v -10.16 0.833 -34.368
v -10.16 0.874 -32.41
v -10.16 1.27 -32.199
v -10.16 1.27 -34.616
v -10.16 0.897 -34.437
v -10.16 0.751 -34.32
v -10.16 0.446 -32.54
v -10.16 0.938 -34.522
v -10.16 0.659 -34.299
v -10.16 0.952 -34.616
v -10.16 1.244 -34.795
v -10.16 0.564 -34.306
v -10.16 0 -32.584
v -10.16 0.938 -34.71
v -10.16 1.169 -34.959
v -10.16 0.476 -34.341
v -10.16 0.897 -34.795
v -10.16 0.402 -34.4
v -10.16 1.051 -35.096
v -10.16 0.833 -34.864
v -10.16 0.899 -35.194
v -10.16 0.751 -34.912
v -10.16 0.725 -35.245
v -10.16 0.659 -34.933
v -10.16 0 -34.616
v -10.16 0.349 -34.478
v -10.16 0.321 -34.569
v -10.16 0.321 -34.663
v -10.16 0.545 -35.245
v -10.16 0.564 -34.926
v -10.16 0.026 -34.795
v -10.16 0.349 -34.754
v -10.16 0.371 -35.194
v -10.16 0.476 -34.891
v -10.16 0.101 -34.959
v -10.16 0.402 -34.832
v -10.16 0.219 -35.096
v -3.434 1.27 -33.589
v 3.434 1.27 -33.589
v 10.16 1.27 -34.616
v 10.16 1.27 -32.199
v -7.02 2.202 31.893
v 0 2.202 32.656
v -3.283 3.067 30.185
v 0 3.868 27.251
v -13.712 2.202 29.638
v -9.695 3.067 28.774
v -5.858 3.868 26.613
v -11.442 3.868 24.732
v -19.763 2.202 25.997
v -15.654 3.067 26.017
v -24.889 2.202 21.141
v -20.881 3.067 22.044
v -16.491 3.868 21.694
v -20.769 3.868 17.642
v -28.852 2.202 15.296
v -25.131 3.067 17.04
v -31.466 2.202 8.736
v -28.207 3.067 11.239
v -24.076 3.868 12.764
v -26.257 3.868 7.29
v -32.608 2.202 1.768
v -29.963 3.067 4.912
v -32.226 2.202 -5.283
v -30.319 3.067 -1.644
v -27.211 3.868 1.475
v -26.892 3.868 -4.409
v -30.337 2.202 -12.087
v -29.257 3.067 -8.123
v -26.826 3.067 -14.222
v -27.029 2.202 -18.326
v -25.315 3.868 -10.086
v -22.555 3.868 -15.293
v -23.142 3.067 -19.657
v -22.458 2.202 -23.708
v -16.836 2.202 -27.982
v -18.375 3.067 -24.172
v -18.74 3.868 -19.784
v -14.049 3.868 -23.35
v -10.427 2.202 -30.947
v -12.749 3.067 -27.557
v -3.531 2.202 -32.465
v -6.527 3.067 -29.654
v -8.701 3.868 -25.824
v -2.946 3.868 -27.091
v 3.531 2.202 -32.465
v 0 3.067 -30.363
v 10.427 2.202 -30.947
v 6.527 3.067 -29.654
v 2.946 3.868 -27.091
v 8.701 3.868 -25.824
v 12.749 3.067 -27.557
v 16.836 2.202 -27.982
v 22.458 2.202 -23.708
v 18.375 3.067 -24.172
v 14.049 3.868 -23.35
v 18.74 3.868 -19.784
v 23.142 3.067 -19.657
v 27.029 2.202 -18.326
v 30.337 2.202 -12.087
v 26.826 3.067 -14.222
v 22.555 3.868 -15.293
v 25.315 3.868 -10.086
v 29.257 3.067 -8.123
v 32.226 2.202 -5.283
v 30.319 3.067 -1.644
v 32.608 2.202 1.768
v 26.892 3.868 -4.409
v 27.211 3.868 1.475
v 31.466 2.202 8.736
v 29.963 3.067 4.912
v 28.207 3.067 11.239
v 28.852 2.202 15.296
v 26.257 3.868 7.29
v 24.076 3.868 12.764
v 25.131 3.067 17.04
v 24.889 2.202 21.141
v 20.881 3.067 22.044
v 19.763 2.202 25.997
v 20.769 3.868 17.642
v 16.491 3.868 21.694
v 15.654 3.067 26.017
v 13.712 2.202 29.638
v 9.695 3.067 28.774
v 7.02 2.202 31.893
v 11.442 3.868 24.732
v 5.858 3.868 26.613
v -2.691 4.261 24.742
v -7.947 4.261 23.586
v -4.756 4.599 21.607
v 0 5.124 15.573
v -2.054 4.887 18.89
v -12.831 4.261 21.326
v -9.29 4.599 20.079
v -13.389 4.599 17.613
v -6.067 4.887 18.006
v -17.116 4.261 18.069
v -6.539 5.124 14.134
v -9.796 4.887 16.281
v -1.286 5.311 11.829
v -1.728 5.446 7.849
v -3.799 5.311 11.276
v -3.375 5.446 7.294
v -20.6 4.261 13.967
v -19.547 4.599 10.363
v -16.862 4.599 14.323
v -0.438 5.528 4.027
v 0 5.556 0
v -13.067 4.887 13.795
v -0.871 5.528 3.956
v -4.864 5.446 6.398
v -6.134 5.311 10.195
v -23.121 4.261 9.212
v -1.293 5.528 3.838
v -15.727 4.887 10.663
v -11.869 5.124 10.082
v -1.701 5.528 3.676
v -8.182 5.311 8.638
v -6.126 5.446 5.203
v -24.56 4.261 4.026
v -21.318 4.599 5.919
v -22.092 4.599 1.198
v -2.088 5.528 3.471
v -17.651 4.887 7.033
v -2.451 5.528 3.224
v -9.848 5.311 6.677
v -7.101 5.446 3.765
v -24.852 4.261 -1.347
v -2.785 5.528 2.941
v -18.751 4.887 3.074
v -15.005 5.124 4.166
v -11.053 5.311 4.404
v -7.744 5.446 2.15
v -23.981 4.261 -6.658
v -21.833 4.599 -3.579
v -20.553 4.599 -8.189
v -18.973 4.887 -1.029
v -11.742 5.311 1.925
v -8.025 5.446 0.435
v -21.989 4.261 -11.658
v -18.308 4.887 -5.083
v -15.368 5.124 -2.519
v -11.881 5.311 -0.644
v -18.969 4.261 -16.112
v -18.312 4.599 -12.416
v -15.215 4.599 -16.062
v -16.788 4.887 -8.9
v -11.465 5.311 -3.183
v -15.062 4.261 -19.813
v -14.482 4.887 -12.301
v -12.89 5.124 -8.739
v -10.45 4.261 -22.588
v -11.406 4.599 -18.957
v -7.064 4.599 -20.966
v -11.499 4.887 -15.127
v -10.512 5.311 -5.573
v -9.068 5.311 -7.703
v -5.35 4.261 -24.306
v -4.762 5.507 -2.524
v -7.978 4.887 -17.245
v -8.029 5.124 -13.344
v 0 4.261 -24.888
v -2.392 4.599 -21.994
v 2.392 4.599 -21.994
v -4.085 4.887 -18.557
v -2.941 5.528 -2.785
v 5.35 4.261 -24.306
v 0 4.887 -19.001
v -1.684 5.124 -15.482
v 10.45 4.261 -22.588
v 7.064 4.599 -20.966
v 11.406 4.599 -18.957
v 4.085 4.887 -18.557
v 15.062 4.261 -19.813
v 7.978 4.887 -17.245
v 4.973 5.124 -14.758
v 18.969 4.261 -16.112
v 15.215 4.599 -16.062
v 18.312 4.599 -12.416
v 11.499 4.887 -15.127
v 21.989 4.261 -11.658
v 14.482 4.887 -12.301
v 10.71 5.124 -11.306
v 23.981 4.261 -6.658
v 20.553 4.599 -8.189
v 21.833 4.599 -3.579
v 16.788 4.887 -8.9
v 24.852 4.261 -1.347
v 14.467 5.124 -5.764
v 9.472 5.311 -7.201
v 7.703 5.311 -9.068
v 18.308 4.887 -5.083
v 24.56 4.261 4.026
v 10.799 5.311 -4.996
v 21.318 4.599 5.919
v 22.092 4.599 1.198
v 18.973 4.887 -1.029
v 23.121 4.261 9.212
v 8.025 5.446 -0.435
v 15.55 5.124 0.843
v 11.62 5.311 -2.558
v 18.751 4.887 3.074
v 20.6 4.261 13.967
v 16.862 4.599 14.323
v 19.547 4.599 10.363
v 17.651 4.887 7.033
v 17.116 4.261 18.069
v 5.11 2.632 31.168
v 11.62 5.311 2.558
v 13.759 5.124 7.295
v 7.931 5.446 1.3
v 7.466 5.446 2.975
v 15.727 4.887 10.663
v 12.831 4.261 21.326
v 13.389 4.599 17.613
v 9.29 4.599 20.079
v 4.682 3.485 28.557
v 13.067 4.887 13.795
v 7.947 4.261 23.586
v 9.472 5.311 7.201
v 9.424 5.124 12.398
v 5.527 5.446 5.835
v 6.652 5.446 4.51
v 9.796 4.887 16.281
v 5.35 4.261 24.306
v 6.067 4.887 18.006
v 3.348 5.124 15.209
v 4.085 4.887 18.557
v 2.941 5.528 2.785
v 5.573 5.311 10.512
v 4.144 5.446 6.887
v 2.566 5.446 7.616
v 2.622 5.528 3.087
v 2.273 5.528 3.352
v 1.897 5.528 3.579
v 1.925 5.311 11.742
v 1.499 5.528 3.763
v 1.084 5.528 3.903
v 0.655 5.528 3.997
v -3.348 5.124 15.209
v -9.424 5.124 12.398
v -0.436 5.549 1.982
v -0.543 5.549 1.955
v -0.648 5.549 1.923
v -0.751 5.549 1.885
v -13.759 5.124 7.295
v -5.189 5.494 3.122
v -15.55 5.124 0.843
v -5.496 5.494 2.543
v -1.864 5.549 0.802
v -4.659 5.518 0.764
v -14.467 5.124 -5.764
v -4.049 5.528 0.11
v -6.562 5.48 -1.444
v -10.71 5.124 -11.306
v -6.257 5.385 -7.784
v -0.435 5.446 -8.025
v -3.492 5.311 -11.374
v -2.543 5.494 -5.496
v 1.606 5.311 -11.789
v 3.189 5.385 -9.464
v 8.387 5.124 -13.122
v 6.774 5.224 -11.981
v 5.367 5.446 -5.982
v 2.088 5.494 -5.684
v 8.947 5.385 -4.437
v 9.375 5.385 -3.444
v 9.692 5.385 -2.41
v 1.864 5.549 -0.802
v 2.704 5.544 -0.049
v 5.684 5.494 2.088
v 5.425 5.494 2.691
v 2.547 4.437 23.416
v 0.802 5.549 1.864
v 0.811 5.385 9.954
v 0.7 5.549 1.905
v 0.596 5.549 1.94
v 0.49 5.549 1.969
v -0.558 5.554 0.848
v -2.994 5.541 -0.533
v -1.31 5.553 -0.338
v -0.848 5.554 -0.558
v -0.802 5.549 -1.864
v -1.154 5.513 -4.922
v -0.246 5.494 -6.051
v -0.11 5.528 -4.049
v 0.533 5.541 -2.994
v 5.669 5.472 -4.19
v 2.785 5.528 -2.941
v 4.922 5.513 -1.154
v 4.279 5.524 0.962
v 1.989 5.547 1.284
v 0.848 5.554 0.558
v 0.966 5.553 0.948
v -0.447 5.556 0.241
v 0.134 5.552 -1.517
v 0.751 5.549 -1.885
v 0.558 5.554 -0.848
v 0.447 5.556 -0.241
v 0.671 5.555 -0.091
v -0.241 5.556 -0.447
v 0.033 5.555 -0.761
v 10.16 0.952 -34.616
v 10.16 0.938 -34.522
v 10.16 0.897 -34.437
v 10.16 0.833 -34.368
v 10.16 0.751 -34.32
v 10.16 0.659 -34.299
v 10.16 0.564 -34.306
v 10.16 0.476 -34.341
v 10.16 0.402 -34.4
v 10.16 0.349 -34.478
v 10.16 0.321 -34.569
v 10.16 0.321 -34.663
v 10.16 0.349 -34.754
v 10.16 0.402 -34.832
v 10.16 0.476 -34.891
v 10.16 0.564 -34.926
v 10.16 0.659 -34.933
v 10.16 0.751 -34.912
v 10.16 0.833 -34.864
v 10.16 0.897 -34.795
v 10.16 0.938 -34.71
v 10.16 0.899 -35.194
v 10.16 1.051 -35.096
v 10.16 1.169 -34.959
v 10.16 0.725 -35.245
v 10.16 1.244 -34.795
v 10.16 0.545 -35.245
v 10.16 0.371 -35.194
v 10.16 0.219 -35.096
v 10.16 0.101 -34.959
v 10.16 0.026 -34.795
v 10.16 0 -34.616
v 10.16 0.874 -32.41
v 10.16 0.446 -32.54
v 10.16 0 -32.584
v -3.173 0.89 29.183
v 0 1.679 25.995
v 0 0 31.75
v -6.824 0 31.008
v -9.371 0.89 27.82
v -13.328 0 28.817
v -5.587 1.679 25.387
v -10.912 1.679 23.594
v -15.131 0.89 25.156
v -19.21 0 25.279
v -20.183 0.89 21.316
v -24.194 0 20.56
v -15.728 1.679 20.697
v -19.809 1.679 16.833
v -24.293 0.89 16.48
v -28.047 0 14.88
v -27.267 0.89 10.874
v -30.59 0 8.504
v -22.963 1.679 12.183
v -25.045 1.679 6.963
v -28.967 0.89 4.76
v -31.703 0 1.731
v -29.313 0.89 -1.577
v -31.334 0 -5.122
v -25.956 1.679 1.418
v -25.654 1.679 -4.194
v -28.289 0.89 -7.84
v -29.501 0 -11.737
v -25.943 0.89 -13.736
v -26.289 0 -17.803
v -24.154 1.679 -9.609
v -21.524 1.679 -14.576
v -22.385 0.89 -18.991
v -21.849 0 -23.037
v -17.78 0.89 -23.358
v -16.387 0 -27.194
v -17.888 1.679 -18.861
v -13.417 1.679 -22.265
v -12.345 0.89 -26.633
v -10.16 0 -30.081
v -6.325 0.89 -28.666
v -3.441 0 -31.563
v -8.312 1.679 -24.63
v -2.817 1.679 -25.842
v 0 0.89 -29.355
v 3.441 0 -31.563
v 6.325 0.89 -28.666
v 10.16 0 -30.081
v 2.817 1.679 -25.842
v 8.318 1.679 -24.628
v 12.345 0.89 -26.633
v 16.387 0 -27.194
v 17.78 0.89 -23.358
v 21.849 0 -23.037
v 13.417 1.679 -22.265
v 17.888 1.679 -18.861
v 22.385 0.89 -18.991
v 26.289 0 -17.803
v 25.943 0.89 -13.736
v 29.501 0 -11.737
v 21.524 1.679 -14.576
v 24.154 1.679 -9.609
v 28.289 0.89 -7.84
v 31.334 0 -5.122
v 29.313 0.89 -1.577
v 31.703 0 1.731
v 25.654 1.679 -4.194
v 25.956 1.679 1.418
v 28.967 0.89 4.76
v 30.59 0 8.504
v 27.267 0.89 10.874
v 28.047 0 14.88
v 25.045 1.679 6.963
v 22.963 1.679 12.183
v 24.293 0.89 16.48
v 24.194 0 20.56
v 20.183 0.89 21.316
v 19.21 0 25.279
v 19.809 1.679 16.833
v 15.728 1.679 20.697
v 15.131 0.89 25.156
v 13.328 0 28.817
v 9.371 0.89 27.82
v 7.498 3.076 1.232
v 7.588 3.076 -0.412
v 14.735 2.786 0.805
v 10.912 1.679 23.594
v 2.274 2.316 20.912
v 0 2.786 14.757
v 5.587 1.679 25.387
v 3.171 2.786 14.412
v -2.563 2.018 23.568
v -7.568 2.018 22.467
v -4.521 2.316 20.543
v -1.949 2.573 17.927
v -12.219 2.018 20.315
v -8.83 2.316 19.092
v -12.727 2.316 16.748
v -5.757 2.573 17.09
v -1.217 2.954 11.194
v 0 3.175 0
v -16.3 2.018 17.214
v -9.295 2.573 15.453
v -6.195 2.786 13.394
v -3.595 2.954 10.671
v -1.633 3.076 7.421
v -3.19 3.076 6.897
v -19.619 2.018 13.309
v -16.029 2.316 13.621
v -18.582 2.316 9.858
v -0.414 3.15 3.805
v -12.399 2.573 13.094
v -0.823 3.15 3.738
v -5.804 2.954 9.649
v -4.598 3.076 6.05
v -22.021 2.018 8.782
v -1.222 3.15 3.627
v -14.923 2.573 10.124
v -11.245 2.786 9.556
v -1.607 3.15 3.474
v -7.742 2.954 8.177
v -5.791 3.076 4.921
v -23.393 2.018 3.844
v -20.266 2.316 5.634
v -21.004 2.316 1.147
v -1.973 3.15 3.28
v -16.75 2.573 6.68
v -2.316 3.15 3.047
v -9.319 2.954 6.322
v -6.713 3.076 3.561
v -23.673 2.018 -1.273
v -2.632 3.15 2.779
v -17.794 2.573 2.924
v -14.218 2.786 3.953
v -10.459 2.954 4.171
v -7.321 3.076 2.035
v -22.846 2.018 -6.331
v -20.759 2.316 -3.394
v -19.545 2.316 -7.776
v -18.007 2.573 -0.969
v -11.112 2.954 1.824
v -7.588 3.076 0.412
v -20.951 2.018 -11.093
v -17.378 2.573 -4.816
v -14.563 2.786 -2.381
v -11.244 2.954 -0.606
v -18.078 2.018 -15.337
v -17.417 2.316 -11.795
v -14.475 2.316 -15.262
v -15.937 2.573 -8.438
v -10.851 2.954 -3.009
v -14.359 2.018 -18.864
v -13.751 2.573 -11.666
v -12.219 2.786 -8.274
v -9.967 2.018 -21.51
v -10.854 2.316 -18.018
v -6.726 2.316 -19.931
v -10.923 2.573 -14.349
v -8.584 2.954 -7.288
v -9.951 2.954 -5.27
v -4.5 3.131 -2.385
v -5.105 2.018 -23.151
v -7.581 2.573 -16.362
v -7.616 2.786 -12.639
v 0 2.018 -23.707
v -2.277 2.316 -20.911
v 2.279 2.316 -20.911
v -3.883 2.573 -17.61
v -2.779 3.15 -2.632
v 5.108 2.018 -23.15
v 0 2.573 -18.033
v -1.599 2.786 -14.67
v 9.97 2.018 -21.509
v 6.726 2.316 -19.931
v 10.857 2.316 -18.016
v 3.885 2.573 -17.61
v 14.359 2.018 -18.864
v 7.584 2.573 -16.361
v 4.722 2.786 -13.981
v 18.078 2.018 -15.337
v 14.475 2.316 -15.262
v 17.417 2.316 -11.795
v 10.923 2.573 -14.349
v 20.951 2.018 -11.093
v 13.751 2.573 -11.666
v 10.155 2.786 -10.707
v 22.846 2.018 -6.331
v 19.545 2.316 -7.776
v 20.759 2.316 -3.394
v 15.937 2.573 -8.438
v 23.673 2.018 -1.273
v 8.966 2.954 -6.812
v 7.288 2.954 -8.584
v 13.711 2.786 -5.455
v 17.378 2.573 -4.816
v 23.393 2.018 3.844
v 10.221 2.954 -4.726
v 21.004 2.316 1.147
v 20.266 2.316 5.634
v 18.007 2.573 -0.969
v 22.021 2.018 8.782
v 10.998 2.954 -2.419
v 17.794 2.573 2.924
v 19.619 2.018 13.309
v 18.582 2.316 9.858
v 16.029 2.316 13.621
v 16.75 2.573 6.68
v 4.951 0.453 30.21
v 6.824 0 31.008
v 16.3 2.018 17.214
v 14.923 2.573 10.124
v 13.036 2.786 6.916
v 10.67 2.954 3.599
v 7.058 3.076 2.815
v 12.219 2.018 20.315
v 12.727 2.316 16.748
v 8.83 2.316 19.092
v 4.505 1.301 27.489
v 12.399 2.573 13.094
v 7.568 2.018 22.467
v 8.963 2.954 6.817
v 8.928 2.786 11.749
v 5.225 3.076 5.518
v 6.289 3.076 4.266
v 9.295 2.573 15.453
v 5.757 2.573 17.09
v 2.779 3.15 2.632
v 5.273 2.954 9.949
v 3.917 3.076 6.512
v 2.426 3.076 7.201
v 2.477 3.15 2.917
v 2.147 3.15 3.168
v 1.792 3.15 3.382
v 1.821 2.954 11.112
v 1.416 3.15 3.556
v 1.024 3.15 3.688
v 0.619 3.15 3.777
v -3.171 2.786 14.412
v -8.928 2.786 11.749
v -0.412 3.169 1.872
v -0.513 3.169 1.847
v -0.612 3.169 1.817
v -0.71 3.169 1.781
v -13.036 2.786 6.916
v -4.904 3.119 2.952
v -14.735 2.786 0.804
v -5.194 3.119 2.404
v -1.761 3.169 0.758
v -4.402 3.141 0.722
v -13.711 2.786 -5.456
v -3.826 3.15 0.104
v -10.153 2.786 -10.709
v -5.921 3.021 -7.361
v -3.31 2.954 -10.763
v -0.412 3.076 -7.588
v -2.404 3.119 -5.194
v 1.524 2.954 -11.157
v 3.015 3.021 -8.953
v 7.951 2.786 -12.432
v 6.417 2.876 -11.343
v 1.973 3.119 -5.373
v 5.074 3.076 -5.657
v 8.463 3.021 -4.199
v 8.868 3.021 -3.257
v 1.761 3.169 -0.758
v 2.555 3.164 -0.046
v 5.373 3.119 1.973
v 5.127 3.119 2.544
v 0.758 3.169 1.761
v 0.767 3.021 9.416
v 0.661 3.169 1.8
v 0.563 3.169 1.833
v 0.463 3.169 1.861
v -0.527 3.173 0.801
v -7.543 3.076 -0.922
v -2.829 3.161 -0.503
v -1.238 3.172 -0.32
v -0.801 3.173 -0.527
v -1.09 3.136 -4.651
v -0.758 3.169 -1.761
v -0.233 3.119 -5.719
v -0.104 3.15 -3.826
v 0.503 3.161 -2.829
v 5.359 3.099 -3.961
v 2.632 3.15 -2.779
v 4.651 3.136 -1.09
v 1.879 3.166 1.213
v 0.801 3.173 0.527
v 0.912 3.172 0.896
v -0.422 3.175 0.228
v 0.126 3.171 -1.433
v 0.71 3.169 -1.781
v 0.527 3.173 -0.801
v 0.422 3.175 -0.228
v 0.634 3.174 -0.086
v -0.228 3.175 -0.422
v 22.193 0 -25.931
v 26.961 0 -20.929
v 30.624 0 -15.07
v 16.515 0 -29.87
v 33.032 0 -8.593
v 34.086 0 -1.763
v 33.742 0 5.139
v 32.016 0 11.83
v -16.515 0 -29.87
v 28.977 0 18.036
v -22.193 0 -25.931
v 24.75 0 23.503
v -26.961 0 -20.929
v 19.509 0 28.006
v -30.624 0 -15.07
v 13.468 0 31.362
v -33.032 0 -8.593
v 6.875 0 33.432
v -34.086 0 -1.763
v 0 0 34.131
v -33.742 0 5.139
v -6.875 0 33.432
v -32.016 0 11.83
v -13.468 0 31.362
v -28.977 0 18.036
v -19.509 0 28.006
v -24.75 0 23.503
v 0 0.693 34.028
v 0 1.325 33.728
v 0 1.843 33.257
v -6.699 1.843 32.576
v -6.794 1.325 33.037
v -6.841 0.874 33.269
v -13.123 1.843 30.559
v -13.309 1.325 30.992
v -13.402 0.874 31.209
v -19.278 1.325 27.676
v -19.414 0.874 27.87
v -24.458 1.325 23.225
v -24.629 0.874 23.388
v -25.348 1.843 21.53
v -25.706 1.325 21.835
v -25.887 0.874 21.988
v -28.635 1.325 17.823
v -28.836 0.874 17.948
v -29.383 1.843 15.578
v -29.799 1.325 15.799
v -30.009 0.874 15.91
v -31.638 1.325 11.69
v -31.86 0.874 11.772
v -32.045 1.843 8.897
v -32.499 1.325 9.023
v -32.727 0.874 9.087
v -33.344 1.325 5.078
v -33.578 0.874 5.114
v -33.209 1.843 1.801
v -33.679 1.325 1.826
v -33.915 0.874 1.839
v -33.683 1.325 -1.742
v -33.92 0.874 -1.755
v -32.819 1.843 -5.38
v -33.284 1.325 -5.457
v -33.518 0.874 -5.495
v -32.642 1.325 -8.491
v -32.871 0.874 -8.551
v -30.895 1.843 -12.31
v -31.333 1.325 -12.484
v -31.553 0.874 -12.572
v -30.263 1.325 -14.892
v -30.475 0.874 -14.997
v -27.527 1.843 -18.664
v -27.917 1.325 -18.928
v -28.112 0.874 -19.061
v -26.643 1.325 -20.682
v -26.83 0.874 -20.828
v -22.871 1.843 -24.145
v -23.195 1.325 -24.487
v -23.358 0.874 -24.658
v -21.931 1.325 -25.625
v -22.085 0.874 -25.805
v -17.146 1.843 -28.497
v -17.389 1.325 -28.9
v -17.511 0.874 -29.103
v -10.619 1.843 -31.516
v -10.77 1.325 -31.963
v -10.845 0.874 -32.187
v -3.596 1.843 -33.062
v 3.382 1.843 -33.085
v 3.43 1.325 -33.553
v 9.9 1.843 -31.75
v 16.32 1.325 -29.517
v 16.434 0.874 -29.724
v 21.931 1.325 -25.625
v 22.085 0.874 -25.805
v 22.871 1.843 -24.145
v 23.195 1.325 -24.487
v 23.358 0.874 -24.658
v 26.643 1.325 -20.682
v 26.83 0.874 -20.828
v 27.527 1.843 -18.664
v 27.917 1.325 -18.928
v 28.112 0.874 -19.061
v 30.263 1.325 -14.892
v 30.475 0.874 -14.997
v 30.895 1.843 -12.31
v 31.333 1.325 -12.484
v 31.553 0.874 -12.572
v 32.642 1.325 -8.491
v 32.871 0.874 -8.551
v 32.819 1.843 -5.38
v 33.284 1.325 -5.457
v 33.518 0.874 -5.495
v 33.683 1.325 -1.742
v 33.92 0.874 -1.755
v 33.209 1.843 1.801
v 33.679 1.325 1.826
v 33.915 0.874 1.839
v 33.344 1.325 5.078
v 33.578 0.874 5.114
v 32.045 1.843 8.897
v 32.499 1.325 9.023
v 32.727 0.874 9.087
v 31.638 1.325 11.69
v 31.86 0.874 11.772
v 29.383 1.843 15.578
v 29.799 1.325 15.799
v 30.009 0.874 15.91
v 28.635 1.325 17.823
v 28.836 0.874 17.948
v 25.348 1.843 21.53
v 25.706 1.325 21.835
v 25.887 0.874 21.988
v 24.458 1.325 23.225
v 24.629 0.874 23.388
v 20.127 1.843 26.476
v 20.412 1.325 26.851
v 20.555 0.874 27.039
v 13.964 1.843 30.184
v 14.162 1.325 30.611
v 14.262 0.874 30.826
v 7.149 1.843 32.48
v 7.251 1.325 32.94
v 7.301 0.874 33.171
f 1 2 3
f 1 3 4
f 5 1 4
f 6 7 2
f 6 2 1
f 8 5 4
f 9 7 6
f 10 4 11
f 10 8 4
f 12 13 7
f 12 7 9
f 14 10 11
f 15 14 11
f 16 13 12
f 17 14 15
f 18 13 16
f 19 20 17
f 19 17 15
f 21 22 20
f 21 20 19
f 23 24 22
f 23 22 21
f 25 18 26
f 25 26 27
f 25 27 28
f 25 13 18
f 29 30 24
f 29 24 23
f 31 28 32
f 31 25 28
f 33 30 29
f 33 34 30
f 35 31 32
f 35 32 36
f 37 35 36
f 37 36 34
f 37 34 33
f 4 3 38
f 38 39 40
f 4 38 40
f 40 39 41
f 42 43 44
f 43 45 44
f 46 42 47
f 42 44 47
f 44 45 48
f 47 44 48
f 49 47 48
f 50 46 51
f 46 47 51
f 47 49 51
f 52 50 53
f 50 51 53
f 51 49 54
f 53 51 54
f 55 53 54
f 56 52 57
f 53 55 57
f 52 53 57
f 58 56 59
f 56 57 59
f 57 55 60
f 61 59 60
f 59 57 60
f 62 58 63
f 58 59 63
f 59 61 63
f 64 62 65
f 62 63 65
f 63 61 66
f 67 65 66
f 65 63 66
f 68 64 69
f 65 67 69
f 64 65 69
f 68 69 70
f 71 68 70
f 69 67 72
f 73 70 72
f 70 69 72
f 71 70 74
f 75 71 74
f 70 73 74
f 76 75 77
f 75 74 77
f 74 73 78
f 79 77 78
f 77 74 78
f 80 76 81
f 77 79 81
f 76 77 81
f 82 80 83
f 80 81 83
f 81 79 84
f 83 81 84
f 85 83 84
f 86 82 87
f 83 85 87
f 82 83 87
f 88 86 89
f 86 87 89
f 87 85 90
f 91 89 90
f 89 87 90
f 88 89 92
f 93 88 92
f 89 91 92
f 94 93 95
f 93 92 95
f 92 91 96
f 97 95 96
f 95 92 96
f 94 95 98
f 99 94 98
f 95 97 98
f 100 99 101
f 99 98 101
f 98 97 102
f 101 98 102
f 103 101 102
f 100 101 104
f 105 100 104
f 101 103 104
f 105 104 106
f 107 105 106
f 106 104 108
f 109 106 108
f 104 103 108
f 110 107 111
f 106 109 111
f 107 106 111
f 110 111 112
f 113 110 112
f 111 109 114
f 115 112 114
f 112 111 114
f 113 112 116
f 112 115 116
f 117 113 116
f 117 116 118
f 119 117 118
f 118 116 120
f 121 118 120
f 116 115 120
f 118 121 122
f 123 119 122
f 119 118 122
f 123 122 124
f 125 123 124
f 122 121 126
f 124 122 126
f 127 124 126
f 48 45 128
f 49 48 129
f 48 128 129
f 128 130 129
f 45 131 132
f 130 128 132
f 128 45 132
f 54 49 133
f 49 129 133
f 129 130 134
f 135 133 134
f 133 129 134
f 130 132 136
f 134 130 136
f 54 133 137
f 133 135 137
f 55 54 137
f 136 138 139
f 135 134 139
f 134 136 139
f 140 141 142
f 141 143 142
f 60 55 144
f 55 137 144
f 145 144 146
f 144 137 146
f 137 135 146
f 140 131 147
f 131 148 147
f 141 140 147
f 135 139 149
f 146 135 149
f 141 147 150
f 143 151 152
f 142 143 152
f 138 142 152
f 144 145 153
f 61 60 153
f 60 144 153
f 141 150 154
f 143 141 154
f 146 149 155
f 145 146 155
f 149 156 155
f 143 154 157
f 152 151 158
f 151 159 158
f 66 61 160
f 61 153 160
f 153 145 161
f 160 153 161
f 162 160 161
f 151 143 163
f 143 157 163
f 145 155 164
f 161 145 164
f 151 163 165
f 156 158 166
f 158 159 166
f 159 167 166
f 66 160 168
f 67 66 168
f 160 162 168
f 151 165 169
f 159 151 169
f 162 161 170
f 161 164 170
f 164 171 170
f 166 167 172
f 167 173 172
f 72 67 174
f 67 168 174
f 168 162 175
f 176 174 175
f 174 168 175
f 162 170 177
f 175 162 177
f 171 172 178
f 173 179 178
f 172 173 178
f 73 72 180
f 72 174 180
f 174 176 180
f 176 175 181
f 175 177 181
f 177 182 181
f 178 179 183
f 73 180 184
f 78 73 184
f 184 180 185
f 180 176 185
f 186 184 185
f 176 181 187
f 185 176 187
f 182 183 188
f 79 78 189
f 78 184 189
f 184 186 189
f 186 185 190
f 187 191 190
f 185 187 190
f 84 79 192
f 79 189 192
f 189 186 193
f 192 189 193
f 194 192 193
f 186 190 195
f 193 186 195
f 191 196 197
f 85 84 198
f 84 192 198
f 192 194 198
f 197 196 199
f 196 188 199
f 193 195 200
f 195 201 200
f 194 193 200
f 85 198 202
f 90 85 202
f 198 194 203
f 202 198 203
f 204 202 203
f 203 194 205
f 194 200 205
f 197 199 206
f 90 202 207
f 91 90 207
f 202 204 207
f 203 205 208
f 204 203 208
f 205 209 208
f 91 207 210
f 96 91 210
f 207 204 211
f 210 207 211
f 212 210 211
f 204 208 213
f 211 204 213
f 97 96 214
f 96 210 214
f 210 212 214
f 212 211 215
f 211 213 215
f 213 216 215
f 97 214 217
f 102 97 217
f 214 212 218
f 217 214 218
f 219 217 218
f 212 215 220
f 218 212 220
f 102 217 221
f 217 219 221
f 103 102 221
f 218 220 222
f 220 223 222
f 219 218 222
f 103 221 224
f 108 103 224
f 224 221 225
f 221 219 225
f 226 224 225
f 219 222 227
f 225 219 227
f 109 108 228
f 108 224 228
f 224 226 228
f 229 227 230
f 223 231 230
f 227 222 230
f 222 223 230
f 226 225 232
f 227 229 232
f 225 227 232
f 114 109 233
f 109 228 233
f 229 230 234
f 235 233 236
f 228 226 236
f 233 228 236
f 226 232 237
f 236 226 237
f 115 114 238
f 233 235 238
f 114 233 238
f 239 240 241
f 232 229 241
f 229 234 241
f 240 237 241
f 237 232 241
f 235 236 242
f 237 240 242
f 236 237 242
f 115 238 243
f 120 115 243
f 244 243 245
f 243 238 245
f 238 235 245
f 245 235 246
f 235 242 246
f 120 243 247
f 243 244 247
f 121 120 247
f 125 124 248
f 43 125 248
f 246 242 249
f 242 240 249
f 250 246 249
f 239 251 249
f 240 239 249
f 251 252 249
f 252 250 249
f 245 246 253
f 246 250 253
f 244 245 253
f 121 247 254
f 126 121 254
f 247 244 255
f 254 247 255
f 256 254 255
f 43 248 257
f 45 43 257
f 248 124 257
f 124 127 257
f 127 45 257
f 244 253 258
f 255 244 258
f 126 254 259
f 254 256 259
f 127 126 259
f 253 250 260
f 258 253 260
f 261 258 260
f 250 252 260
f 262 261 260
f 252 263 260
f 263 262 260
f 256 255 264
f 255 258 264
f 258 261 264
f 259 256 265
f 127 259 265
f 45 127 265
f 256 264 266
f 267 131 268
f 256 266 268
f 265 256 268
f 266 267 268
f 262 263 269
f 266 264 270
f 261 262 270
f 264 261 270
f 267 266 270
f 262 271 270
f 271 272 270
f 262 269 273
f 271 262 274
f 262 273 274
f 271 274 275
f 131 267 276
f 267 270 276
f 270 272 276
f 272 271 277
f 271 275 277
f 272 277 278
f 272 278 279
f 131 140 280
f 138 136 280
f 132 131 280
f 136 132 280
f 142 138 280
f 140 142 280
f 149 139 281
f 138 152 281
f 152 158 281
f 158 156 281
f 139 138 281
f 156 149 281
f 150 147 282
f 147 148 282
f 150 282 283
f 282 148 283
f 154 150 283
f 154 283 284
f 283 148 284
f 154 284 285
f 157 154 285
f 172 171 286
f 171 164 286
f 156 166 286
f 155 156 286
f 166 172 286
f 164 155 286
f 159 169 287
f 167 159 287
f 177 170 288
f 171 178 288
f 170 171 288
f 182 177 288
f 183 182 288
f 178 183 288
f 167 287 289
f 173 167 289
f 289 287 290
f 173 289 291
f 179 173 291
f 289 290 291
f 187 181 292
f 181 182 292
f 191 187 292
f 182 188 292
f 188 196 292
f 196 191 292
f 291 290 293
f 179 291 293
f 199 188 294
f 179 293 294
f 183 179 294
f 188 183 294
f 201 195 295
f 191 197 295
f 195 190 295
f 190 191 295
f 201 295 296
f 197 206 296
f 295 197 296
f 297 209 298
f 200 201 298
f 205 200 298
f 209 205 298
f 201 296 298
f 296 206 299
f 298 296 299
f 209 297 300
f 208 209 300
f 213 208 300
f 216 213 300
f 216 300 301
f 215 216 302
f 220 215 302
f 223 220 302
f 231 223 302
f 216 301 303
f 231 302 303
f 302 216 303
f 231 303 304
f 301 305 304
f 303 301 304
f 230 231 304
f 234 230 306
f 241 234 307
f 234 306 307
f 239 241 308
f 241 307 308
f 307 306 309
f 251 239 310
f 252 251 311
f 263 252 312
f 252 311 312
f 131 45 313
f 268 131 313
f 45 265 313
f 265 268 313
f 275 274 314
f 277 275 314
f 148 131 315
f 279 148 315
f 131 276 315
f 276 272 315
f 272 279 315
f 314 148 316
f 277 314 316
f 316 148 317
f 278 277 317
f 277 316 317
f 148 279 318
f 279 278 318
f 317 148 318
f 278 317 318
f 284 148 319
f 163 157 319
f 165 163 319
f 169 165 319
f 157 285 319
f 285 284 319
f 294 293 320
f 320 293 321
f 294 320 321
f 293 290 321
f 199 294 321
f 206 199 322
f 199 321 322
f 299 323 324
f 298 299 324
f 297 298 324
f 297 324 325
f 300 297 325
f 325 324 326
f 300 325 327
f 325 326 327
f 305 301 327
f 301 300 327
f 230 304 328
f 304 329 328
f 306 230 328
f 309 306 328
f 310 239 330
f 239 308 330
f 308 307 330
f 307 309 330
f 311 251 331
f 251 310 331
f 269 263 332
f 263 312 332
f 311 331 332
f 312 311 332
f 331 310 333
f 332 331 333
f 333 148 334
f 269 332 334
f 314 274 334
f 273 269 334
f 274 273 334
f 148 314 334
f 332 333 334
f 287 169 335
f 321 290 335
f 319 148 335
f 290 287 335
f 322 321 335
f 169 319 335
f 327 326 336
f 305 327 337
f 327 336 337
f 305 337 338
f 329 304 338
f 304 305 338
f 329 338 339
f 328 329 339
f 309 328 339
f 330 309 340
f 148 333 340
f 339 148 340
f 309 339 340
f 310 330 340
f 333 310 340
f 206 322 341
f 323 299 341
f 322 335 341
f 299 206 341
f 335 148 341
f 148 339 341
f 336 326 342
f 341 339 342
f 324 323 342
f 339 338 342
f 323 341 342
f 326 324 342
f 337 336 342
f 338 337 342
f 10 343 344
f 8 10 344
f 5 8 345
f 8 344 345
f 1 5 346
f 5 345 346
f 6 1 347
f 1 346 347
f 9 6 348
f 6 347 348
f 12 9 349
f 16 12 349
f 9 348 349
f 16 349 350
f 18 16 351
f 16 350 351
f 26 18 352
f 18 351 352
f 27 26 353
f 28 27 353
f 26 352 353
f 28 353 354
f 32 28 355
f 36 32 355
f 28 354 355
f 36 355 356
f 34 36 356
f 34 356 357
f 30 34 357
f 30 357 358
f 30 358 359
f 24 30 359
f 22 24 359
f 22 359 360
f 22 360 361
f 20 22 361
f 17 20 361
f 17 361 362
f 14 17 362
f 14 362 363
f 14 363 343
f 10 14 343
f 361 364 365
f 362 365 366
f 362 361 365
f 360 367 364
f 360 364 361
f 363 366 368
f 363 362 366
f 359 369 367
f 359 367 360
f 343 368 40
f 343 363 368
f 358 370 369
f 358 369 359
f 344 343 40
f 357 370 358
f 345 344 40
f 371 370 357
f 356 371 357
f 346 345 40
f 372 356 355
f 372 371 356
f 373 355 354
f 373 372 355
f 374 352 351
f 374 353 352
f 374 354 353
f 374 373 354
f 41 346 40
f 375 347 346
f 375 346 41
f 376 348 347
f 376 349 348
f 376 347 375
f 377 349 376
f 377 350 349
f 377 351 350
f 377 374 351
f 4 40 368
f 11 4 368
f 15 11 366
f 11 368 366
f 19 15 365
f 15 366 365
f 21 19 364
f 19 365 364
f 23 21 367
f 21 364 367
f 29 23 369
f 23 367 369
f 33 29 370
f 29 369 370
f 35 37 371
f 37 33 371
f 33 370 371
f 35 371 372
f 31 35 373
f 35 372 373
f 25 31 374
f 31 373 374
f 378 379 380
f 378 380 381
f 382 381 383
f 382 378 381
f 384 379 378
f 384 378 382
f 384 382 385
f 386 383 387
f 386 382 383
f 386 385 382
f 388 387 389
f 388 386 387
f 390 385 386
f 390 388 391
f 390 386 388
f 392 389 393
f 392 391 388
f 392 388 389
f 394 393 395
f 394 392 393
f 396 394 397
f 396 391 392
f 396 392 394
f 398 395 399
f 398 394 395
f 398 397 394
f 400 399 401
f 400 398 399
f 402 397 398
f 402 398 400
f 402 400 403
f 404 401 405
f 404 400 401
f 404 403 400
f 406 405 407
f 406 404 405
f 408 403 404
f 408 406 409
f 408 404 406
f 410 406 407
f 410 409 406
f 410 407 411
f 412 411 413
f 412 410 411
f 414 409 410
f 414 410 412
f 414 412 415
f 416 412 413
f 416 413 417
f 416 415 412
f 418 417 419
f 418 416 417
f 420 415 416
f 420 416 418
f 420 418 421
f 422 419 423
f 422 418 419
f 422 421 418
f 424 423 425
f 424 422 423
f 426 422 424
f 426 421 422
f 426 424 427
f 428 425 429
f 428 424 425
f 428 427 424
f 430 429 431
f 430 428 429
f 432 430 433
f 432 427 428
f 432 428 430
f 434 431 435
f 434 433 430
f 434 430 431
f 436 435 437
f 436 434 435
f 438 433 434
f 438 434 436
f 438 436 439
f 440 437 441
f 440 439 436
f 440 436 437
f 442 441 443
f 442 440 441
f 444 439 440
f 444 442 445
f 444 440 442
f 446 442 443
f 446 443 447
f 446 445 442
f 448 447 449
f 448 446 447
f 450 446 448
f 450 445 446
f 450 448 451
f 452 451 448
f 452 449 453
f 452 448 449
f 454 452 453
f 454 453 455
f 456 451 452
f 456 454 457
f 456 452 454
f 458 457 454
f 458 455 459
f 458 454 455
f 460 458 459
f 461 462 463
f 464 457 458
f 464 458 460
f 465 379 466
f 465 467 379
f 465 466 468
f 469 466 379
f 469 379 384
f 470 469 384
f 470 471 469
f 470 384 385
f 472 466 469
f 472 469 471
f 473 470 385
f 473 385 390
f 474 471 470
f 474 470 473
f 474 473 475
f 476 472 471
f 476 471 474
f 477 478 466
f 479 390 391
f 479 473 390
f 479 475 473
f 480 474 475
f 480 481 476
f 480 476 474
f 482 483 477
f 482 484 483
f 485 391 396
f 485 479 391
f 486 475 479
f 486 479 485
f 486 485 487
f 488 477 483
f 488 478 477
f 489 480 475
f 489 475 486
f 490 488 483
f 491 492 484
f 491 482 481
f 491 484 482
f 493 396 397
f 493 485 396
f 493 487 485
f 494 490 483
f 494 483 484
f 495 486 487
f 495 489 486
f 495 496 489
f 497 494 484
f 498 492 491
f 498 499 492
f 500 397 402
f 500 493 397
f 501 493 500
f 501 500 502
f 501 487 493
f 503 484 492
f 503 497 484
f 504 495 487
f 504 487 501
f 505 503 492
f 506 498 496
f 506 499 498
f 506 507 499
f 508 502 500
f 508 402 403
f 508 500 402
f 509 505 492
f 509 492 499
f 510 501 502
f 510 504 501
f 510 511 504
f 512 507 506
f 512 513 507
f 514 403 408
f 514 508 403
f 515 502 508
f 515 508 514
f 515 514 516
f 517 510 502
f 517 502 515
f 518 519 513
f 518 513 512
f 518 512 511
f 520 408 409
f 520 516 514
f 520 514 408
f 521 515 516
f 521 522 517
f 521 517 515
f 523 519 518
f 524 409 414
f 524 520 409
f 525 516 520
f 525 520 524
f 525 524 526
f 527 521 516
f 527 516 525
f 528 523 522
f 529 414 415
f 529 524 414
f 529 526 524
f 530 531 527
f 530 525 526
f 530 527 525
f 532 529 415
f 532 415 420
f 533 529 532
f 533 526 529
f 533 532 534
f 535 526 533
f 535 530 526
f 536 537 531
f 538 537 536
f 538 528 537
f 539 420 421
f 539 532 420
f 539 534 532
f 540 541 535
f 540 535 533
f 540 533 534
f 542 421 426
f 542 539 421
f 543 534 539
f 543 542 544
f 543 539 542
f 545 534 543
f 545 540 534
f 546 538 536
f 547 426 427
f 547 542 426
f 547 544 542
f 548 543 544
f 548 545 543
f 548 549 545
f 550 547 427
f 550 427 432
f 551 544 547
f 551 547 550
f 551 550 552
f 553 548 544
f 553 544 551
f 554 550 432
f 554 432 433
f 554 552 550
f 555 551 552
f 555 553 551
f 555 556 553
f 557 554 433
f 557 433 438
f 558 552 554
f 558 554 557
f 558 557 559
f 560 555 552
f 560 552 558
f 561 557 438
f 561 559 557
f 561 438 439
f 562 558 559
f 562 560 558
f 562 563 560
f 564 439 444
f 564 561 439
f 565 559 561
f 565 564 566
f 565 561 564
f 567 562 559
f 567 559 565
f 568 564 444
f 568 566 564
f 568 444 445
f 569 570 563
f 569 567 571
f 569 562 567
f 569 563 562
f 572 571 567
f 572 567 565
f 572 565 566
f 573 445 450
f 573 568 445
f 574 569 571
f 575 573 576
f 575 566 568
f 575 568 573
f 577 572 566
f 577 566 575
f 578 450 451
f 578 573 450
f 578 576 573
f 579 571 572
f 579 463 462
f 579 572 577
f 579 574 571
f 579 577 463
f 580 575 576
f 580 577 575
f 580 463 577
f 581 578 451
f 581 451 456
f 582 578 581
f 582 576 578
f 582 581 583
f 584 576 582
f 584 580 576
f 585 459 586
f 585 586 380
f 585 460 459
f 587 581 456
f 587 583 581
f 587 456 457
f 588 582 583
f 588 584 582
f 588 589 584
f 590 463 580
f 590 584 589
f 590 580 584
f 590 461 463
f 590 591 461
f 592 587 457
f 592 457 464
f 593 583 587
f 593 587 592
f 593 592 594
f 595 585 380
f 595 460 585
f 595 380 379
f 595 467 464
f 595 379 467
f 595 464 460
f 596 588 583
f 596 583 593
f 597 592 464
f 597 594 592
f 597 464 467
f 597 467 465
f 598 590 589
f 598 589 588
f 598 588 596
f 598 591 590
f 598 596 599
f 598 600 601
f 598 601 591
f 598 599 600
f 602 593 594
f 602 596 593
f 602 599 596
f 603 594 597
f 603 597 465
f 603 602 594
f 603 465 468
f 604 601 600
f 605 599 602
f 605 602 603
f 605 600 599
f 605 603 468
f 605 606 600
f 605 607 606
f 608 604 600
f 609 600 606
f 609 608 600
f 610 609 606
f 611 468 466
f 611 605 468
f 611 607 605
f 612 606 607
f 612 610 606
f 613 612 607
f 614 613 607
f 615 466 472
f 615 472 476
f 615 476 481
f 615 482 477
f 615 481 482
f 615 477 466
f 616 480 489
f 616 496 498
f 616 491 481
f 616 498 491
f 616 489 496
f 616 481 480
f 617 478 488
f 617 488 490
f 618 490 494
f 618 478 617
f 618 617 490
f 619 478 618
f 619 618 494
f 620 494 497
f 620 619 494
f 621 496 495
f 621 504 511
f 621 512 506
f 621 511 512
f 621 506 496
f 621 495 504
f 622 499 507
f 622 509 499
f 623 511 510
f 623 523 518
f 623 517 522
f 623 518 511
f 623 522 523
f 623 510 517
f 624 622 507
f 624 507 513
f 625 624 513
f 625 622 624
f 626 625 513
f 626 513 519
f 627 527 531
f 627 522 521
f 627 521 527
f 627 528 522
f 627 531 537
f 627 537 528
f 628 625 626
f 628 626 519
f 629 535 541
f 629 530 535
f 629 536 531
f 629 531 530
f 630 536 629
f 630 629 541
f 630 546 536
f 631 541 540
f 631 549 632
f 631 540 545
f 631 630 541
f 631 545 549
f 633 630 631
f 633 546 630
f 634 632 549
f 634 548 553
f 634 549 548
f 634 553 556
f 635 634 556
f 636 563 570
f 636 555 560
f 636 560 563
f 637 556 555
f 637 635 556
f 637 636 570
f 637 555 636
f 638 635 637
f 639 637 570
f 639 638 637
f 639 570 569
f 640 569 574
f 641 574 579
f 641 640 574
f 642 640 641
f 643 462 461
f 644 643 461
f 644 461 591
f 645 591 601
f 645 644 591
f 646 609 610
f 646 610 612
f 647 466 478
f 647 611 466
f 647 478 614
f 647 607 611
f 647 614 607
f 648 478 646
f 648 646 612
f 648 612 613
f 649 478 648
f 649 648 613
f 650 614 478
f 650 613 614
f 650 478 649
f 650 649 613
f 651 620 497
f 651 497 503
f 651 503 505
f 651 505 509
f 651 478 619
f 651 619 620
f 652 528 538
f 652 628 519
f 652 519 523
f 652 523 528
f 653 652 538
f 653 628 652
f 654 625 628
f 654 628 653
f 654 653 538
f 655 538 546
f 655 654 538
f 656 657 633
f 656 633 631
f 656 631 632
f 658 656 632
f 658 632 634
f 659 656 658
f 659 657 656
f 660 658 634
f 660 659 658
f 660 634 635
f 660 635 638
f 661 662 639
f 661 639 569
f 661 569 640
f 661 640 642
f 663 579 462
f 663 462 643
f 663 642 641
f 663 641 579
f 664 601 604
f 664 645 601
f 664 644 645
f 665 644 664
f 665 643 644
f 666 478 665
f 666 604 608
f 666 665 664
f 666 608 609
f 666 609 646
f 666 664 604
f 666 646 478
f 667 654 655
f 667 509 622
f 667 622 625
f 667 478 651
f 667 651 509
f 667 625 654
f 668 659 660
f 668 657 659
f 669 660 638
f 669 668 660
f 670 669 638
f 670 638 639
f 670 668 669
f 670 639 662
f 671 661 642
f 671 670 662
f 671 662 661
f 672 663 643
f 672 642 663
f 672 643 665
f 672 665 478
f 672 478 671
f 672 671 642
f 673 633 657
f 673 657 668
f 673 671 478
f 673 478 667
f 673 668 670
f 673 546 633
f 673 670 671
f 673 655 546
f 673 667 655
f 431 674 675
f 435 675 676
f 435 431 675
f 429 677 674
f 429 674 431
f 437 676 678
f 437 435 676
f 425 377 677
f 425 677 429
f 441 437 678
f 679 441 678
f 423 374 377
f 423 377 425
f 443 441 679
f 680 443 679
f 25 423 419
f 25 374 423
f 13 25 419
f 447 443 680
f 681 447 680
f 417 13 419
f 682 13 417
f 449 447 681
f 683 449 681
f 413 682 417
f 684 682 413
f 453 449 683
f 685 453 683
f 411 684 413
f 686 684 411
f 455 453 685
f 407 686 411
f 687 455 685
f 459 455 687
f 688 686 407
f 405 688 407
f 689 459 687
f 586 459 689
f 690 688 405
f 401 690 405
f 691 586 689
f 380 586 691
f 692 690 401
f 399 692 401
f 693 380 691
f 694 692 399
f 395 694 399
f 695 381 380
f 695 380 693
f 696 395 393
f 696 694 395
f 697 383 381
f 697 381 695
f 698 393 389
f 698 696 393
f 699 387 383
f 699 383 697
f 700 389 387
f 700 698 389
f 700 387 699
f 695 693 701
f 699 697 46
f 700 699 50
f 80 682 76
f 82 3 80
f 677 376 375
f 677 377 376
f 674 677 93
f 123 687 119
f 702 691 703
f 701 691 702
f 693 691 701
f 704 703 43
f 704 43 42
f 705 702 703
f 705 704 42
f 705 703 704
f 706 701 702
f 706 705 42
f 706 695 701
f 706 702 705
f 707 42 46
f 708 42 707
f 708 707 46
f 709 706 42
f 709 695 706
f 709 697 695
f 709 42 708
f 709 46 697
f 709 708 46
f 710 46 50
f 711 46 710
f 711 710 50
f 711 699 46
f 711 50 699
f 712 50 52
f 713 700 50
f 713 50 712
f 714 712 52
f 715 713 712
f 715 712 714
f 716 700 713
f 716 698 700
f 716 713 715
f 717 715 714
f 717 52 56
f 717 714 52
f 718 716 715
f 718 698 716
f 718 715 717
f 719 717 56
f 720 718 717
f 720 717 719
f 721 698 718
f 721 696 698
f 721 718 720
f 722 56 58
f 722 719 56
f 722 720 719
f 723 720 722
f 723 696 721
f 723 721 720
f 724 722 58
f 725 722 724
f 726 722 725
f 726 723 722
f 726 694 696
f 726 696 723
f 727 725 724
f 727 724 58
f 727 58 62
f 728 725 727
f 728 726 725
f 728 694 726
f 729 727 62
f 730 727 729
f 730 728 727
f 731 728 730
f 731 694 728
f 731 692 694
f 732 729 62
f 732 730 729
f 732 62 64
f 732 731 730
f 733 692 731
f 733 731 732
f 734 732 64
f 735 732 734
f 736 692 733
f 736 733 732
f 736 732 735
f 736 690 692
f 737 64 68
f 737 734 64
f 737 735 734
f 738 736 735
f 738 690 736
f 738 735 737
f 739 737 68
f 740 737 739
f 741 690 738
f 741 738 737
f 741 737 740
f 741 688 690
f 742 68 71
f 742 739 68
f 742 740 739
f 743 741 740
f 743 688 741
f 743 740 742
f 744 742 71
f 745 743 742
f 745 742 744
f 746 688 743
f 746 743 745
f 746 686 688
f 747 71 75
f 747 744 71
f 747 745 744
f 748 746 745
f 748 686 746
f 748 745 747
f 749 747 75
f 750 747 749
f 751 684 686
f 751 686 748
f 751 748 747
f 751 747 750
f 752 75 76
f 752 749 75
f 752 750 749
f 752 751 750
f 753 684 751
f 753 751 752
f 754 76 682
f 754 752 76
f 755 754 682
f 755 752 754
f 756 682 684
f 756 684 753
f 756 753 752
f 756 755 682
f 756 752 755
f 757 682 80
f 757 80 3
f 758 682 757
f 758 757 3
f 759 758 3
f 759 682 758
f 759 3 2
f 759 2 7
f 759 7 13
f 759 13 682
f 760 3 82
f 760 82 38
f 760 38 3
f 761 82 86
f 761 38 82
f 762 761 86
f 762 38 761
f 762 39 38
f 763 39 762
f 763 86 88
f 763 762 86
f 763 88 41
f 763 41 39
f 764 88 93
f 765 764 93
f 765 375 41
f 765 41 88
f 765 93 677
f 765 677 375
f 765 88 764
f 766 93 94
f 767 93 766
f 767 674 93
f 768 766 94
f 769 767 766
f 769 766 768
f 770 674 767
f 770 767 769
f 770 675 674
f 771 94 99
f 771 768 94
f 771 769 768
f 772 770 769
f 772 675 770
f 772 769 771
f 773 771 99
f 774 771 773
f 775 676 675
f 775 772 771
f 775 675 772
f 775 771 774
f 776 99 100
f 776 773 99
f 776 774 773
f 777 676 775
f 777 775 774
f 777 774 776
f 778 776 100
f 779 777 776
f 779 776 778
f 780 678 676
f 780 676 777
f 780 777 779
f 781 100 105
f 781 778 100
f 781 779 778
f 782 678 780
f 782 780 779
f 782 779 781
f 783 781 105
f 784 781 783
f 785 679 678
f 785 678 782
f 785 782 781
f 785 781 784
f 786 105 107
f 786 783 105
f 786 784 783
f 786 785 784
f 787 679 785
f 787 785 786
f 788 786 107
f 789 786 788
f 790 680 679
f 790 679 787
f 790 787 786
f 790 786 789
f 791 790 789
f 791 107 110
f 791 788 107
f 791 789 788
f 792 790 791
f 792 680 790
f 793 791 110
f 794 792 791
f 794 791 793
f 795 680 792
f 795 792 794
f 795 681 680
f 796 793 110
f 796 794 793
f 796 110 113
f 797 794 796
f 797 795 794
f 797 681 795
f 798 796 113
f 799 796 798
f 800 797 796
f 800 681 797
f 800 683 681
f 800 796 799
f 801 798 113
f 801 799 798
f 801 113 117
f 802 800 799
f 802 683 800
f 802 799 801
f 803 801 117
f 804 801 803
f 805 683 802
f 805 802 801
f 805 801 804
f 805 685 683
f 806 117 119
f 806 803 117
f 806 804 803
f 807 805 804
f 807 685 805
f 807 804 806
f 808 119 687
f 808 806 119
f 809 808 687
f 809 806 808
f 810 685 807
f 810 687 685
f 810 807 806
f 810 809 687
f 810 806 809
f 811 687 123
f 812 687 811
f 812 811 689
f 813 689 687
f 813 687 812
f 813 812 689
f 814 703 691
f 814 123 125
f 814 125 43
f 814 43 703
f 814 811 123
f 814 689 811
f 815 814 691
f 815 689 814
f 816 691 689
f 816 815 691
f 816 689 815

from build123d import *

# Parameters (mm, degrees)
F3_DEPTH = 1.27
F4_R     = 0.3175
F5_DEPTH = 44.2922501


# Not quite as in the source:
# - the dataset's text gives a spline's control points without its knots; the knots are read off the source's solid


with BuildPart() as f1:
    # F0 (on Right) → F1 (revolve)
    with BuildSketch(Plane.YZ):
        with BuildLine():
            Line((0, 34.13125), (0, 31.75))
            add(Edge.make_bspline(
                [(0, 31.75), (0.5742670905, 30.3542906008), (2.3414834837, 25.8865164681), (3.175, 10.5516560434), (3.175, 0)],
                knots=[0, 0, 0, 0, 0.3124675666, 1, 1, 1, 1], degree=3))
            Line((3.175, 0), (5.55625, 0))
            add(Edge.make_bspline(
                [(2.2021322713, 32.6560712016), (2.3186413793, 32.3729053021), (2.5576698716, 31.7878917938), (2.9240965193, 30.812098832), (3.2829237449, 29.7062776723), (3.6213582396, 28.4414870624), (3.9333609229, 26.9775001767), (4.2135585587, 25.2856930459), (4.4651056247, 23.3880591837), (4.7658122637, 20.5979082433), (5.0781689931, 16.6702210435), (5.3509257758, 11.4172981506), (5.5180630854, 5.8010058197), (5.55625, 1.9340677683), (5.55625, 0)],
                knots=[1e-10, 1e-10, 1e-10, 1e-10, 0.0625000001, 0.1250000001, 0.1875000001, 0.2500000001, 0.3125000001, 0.3750000001, 0.4375000001, 0.5, 0.625, 0.75, 0.875, 1, 1, 1, 1], degree=3))
            ThreePointArc((2.2021322713, 32.6560712016), (1.3252866697, 33.728374789), (0, 34.13125))
        make_face()
    revolve(axis=Axis((0, 4.365625, 0), (0, -1, 0)))

    # F2 (on face) → F3 (join)
    with BuildSketch(Plane.XZ):
        with BuildLine():
            Line((-10.16, -30.0805069771), (-10.16, -35.2621069771))
            Line((-10.16, -35.2621069771), (10.16, -35.2621069771))
            Line((10.16, -35.2621069771), (10.16, -30.0805069771))
            ThreePointArc((10.16, -30.0805069771), (0, -31.75), (-10.16, -30.0805069771))
        make_face()
    extrude(amount=-F3_DEPTH)

    # F4 (on face) → F5 (cut, through all)
    with BuildSketch(Plane.YZ.offset(10.16)):
        with Locations((0.635, -34.6159934103)):
            Circle(F4_R)
        with BuildLine():
            Line((1.27, -35.2621069771), (1.27, -34.6159934103))
            ThreePointArc((1.27, -34.6159934103), (0.635, -35.2509934103), (0, -34.6159934103))
            Line((0, -34.6159934103), (0, -35.2621069771))
            Line((0, -35.2621069771), (1.27, -35.2621069771))
        make_face()
    extrude(amount=-F5_DEPTH, mode=Mode.SUBTRACT)


solid = f1.part
